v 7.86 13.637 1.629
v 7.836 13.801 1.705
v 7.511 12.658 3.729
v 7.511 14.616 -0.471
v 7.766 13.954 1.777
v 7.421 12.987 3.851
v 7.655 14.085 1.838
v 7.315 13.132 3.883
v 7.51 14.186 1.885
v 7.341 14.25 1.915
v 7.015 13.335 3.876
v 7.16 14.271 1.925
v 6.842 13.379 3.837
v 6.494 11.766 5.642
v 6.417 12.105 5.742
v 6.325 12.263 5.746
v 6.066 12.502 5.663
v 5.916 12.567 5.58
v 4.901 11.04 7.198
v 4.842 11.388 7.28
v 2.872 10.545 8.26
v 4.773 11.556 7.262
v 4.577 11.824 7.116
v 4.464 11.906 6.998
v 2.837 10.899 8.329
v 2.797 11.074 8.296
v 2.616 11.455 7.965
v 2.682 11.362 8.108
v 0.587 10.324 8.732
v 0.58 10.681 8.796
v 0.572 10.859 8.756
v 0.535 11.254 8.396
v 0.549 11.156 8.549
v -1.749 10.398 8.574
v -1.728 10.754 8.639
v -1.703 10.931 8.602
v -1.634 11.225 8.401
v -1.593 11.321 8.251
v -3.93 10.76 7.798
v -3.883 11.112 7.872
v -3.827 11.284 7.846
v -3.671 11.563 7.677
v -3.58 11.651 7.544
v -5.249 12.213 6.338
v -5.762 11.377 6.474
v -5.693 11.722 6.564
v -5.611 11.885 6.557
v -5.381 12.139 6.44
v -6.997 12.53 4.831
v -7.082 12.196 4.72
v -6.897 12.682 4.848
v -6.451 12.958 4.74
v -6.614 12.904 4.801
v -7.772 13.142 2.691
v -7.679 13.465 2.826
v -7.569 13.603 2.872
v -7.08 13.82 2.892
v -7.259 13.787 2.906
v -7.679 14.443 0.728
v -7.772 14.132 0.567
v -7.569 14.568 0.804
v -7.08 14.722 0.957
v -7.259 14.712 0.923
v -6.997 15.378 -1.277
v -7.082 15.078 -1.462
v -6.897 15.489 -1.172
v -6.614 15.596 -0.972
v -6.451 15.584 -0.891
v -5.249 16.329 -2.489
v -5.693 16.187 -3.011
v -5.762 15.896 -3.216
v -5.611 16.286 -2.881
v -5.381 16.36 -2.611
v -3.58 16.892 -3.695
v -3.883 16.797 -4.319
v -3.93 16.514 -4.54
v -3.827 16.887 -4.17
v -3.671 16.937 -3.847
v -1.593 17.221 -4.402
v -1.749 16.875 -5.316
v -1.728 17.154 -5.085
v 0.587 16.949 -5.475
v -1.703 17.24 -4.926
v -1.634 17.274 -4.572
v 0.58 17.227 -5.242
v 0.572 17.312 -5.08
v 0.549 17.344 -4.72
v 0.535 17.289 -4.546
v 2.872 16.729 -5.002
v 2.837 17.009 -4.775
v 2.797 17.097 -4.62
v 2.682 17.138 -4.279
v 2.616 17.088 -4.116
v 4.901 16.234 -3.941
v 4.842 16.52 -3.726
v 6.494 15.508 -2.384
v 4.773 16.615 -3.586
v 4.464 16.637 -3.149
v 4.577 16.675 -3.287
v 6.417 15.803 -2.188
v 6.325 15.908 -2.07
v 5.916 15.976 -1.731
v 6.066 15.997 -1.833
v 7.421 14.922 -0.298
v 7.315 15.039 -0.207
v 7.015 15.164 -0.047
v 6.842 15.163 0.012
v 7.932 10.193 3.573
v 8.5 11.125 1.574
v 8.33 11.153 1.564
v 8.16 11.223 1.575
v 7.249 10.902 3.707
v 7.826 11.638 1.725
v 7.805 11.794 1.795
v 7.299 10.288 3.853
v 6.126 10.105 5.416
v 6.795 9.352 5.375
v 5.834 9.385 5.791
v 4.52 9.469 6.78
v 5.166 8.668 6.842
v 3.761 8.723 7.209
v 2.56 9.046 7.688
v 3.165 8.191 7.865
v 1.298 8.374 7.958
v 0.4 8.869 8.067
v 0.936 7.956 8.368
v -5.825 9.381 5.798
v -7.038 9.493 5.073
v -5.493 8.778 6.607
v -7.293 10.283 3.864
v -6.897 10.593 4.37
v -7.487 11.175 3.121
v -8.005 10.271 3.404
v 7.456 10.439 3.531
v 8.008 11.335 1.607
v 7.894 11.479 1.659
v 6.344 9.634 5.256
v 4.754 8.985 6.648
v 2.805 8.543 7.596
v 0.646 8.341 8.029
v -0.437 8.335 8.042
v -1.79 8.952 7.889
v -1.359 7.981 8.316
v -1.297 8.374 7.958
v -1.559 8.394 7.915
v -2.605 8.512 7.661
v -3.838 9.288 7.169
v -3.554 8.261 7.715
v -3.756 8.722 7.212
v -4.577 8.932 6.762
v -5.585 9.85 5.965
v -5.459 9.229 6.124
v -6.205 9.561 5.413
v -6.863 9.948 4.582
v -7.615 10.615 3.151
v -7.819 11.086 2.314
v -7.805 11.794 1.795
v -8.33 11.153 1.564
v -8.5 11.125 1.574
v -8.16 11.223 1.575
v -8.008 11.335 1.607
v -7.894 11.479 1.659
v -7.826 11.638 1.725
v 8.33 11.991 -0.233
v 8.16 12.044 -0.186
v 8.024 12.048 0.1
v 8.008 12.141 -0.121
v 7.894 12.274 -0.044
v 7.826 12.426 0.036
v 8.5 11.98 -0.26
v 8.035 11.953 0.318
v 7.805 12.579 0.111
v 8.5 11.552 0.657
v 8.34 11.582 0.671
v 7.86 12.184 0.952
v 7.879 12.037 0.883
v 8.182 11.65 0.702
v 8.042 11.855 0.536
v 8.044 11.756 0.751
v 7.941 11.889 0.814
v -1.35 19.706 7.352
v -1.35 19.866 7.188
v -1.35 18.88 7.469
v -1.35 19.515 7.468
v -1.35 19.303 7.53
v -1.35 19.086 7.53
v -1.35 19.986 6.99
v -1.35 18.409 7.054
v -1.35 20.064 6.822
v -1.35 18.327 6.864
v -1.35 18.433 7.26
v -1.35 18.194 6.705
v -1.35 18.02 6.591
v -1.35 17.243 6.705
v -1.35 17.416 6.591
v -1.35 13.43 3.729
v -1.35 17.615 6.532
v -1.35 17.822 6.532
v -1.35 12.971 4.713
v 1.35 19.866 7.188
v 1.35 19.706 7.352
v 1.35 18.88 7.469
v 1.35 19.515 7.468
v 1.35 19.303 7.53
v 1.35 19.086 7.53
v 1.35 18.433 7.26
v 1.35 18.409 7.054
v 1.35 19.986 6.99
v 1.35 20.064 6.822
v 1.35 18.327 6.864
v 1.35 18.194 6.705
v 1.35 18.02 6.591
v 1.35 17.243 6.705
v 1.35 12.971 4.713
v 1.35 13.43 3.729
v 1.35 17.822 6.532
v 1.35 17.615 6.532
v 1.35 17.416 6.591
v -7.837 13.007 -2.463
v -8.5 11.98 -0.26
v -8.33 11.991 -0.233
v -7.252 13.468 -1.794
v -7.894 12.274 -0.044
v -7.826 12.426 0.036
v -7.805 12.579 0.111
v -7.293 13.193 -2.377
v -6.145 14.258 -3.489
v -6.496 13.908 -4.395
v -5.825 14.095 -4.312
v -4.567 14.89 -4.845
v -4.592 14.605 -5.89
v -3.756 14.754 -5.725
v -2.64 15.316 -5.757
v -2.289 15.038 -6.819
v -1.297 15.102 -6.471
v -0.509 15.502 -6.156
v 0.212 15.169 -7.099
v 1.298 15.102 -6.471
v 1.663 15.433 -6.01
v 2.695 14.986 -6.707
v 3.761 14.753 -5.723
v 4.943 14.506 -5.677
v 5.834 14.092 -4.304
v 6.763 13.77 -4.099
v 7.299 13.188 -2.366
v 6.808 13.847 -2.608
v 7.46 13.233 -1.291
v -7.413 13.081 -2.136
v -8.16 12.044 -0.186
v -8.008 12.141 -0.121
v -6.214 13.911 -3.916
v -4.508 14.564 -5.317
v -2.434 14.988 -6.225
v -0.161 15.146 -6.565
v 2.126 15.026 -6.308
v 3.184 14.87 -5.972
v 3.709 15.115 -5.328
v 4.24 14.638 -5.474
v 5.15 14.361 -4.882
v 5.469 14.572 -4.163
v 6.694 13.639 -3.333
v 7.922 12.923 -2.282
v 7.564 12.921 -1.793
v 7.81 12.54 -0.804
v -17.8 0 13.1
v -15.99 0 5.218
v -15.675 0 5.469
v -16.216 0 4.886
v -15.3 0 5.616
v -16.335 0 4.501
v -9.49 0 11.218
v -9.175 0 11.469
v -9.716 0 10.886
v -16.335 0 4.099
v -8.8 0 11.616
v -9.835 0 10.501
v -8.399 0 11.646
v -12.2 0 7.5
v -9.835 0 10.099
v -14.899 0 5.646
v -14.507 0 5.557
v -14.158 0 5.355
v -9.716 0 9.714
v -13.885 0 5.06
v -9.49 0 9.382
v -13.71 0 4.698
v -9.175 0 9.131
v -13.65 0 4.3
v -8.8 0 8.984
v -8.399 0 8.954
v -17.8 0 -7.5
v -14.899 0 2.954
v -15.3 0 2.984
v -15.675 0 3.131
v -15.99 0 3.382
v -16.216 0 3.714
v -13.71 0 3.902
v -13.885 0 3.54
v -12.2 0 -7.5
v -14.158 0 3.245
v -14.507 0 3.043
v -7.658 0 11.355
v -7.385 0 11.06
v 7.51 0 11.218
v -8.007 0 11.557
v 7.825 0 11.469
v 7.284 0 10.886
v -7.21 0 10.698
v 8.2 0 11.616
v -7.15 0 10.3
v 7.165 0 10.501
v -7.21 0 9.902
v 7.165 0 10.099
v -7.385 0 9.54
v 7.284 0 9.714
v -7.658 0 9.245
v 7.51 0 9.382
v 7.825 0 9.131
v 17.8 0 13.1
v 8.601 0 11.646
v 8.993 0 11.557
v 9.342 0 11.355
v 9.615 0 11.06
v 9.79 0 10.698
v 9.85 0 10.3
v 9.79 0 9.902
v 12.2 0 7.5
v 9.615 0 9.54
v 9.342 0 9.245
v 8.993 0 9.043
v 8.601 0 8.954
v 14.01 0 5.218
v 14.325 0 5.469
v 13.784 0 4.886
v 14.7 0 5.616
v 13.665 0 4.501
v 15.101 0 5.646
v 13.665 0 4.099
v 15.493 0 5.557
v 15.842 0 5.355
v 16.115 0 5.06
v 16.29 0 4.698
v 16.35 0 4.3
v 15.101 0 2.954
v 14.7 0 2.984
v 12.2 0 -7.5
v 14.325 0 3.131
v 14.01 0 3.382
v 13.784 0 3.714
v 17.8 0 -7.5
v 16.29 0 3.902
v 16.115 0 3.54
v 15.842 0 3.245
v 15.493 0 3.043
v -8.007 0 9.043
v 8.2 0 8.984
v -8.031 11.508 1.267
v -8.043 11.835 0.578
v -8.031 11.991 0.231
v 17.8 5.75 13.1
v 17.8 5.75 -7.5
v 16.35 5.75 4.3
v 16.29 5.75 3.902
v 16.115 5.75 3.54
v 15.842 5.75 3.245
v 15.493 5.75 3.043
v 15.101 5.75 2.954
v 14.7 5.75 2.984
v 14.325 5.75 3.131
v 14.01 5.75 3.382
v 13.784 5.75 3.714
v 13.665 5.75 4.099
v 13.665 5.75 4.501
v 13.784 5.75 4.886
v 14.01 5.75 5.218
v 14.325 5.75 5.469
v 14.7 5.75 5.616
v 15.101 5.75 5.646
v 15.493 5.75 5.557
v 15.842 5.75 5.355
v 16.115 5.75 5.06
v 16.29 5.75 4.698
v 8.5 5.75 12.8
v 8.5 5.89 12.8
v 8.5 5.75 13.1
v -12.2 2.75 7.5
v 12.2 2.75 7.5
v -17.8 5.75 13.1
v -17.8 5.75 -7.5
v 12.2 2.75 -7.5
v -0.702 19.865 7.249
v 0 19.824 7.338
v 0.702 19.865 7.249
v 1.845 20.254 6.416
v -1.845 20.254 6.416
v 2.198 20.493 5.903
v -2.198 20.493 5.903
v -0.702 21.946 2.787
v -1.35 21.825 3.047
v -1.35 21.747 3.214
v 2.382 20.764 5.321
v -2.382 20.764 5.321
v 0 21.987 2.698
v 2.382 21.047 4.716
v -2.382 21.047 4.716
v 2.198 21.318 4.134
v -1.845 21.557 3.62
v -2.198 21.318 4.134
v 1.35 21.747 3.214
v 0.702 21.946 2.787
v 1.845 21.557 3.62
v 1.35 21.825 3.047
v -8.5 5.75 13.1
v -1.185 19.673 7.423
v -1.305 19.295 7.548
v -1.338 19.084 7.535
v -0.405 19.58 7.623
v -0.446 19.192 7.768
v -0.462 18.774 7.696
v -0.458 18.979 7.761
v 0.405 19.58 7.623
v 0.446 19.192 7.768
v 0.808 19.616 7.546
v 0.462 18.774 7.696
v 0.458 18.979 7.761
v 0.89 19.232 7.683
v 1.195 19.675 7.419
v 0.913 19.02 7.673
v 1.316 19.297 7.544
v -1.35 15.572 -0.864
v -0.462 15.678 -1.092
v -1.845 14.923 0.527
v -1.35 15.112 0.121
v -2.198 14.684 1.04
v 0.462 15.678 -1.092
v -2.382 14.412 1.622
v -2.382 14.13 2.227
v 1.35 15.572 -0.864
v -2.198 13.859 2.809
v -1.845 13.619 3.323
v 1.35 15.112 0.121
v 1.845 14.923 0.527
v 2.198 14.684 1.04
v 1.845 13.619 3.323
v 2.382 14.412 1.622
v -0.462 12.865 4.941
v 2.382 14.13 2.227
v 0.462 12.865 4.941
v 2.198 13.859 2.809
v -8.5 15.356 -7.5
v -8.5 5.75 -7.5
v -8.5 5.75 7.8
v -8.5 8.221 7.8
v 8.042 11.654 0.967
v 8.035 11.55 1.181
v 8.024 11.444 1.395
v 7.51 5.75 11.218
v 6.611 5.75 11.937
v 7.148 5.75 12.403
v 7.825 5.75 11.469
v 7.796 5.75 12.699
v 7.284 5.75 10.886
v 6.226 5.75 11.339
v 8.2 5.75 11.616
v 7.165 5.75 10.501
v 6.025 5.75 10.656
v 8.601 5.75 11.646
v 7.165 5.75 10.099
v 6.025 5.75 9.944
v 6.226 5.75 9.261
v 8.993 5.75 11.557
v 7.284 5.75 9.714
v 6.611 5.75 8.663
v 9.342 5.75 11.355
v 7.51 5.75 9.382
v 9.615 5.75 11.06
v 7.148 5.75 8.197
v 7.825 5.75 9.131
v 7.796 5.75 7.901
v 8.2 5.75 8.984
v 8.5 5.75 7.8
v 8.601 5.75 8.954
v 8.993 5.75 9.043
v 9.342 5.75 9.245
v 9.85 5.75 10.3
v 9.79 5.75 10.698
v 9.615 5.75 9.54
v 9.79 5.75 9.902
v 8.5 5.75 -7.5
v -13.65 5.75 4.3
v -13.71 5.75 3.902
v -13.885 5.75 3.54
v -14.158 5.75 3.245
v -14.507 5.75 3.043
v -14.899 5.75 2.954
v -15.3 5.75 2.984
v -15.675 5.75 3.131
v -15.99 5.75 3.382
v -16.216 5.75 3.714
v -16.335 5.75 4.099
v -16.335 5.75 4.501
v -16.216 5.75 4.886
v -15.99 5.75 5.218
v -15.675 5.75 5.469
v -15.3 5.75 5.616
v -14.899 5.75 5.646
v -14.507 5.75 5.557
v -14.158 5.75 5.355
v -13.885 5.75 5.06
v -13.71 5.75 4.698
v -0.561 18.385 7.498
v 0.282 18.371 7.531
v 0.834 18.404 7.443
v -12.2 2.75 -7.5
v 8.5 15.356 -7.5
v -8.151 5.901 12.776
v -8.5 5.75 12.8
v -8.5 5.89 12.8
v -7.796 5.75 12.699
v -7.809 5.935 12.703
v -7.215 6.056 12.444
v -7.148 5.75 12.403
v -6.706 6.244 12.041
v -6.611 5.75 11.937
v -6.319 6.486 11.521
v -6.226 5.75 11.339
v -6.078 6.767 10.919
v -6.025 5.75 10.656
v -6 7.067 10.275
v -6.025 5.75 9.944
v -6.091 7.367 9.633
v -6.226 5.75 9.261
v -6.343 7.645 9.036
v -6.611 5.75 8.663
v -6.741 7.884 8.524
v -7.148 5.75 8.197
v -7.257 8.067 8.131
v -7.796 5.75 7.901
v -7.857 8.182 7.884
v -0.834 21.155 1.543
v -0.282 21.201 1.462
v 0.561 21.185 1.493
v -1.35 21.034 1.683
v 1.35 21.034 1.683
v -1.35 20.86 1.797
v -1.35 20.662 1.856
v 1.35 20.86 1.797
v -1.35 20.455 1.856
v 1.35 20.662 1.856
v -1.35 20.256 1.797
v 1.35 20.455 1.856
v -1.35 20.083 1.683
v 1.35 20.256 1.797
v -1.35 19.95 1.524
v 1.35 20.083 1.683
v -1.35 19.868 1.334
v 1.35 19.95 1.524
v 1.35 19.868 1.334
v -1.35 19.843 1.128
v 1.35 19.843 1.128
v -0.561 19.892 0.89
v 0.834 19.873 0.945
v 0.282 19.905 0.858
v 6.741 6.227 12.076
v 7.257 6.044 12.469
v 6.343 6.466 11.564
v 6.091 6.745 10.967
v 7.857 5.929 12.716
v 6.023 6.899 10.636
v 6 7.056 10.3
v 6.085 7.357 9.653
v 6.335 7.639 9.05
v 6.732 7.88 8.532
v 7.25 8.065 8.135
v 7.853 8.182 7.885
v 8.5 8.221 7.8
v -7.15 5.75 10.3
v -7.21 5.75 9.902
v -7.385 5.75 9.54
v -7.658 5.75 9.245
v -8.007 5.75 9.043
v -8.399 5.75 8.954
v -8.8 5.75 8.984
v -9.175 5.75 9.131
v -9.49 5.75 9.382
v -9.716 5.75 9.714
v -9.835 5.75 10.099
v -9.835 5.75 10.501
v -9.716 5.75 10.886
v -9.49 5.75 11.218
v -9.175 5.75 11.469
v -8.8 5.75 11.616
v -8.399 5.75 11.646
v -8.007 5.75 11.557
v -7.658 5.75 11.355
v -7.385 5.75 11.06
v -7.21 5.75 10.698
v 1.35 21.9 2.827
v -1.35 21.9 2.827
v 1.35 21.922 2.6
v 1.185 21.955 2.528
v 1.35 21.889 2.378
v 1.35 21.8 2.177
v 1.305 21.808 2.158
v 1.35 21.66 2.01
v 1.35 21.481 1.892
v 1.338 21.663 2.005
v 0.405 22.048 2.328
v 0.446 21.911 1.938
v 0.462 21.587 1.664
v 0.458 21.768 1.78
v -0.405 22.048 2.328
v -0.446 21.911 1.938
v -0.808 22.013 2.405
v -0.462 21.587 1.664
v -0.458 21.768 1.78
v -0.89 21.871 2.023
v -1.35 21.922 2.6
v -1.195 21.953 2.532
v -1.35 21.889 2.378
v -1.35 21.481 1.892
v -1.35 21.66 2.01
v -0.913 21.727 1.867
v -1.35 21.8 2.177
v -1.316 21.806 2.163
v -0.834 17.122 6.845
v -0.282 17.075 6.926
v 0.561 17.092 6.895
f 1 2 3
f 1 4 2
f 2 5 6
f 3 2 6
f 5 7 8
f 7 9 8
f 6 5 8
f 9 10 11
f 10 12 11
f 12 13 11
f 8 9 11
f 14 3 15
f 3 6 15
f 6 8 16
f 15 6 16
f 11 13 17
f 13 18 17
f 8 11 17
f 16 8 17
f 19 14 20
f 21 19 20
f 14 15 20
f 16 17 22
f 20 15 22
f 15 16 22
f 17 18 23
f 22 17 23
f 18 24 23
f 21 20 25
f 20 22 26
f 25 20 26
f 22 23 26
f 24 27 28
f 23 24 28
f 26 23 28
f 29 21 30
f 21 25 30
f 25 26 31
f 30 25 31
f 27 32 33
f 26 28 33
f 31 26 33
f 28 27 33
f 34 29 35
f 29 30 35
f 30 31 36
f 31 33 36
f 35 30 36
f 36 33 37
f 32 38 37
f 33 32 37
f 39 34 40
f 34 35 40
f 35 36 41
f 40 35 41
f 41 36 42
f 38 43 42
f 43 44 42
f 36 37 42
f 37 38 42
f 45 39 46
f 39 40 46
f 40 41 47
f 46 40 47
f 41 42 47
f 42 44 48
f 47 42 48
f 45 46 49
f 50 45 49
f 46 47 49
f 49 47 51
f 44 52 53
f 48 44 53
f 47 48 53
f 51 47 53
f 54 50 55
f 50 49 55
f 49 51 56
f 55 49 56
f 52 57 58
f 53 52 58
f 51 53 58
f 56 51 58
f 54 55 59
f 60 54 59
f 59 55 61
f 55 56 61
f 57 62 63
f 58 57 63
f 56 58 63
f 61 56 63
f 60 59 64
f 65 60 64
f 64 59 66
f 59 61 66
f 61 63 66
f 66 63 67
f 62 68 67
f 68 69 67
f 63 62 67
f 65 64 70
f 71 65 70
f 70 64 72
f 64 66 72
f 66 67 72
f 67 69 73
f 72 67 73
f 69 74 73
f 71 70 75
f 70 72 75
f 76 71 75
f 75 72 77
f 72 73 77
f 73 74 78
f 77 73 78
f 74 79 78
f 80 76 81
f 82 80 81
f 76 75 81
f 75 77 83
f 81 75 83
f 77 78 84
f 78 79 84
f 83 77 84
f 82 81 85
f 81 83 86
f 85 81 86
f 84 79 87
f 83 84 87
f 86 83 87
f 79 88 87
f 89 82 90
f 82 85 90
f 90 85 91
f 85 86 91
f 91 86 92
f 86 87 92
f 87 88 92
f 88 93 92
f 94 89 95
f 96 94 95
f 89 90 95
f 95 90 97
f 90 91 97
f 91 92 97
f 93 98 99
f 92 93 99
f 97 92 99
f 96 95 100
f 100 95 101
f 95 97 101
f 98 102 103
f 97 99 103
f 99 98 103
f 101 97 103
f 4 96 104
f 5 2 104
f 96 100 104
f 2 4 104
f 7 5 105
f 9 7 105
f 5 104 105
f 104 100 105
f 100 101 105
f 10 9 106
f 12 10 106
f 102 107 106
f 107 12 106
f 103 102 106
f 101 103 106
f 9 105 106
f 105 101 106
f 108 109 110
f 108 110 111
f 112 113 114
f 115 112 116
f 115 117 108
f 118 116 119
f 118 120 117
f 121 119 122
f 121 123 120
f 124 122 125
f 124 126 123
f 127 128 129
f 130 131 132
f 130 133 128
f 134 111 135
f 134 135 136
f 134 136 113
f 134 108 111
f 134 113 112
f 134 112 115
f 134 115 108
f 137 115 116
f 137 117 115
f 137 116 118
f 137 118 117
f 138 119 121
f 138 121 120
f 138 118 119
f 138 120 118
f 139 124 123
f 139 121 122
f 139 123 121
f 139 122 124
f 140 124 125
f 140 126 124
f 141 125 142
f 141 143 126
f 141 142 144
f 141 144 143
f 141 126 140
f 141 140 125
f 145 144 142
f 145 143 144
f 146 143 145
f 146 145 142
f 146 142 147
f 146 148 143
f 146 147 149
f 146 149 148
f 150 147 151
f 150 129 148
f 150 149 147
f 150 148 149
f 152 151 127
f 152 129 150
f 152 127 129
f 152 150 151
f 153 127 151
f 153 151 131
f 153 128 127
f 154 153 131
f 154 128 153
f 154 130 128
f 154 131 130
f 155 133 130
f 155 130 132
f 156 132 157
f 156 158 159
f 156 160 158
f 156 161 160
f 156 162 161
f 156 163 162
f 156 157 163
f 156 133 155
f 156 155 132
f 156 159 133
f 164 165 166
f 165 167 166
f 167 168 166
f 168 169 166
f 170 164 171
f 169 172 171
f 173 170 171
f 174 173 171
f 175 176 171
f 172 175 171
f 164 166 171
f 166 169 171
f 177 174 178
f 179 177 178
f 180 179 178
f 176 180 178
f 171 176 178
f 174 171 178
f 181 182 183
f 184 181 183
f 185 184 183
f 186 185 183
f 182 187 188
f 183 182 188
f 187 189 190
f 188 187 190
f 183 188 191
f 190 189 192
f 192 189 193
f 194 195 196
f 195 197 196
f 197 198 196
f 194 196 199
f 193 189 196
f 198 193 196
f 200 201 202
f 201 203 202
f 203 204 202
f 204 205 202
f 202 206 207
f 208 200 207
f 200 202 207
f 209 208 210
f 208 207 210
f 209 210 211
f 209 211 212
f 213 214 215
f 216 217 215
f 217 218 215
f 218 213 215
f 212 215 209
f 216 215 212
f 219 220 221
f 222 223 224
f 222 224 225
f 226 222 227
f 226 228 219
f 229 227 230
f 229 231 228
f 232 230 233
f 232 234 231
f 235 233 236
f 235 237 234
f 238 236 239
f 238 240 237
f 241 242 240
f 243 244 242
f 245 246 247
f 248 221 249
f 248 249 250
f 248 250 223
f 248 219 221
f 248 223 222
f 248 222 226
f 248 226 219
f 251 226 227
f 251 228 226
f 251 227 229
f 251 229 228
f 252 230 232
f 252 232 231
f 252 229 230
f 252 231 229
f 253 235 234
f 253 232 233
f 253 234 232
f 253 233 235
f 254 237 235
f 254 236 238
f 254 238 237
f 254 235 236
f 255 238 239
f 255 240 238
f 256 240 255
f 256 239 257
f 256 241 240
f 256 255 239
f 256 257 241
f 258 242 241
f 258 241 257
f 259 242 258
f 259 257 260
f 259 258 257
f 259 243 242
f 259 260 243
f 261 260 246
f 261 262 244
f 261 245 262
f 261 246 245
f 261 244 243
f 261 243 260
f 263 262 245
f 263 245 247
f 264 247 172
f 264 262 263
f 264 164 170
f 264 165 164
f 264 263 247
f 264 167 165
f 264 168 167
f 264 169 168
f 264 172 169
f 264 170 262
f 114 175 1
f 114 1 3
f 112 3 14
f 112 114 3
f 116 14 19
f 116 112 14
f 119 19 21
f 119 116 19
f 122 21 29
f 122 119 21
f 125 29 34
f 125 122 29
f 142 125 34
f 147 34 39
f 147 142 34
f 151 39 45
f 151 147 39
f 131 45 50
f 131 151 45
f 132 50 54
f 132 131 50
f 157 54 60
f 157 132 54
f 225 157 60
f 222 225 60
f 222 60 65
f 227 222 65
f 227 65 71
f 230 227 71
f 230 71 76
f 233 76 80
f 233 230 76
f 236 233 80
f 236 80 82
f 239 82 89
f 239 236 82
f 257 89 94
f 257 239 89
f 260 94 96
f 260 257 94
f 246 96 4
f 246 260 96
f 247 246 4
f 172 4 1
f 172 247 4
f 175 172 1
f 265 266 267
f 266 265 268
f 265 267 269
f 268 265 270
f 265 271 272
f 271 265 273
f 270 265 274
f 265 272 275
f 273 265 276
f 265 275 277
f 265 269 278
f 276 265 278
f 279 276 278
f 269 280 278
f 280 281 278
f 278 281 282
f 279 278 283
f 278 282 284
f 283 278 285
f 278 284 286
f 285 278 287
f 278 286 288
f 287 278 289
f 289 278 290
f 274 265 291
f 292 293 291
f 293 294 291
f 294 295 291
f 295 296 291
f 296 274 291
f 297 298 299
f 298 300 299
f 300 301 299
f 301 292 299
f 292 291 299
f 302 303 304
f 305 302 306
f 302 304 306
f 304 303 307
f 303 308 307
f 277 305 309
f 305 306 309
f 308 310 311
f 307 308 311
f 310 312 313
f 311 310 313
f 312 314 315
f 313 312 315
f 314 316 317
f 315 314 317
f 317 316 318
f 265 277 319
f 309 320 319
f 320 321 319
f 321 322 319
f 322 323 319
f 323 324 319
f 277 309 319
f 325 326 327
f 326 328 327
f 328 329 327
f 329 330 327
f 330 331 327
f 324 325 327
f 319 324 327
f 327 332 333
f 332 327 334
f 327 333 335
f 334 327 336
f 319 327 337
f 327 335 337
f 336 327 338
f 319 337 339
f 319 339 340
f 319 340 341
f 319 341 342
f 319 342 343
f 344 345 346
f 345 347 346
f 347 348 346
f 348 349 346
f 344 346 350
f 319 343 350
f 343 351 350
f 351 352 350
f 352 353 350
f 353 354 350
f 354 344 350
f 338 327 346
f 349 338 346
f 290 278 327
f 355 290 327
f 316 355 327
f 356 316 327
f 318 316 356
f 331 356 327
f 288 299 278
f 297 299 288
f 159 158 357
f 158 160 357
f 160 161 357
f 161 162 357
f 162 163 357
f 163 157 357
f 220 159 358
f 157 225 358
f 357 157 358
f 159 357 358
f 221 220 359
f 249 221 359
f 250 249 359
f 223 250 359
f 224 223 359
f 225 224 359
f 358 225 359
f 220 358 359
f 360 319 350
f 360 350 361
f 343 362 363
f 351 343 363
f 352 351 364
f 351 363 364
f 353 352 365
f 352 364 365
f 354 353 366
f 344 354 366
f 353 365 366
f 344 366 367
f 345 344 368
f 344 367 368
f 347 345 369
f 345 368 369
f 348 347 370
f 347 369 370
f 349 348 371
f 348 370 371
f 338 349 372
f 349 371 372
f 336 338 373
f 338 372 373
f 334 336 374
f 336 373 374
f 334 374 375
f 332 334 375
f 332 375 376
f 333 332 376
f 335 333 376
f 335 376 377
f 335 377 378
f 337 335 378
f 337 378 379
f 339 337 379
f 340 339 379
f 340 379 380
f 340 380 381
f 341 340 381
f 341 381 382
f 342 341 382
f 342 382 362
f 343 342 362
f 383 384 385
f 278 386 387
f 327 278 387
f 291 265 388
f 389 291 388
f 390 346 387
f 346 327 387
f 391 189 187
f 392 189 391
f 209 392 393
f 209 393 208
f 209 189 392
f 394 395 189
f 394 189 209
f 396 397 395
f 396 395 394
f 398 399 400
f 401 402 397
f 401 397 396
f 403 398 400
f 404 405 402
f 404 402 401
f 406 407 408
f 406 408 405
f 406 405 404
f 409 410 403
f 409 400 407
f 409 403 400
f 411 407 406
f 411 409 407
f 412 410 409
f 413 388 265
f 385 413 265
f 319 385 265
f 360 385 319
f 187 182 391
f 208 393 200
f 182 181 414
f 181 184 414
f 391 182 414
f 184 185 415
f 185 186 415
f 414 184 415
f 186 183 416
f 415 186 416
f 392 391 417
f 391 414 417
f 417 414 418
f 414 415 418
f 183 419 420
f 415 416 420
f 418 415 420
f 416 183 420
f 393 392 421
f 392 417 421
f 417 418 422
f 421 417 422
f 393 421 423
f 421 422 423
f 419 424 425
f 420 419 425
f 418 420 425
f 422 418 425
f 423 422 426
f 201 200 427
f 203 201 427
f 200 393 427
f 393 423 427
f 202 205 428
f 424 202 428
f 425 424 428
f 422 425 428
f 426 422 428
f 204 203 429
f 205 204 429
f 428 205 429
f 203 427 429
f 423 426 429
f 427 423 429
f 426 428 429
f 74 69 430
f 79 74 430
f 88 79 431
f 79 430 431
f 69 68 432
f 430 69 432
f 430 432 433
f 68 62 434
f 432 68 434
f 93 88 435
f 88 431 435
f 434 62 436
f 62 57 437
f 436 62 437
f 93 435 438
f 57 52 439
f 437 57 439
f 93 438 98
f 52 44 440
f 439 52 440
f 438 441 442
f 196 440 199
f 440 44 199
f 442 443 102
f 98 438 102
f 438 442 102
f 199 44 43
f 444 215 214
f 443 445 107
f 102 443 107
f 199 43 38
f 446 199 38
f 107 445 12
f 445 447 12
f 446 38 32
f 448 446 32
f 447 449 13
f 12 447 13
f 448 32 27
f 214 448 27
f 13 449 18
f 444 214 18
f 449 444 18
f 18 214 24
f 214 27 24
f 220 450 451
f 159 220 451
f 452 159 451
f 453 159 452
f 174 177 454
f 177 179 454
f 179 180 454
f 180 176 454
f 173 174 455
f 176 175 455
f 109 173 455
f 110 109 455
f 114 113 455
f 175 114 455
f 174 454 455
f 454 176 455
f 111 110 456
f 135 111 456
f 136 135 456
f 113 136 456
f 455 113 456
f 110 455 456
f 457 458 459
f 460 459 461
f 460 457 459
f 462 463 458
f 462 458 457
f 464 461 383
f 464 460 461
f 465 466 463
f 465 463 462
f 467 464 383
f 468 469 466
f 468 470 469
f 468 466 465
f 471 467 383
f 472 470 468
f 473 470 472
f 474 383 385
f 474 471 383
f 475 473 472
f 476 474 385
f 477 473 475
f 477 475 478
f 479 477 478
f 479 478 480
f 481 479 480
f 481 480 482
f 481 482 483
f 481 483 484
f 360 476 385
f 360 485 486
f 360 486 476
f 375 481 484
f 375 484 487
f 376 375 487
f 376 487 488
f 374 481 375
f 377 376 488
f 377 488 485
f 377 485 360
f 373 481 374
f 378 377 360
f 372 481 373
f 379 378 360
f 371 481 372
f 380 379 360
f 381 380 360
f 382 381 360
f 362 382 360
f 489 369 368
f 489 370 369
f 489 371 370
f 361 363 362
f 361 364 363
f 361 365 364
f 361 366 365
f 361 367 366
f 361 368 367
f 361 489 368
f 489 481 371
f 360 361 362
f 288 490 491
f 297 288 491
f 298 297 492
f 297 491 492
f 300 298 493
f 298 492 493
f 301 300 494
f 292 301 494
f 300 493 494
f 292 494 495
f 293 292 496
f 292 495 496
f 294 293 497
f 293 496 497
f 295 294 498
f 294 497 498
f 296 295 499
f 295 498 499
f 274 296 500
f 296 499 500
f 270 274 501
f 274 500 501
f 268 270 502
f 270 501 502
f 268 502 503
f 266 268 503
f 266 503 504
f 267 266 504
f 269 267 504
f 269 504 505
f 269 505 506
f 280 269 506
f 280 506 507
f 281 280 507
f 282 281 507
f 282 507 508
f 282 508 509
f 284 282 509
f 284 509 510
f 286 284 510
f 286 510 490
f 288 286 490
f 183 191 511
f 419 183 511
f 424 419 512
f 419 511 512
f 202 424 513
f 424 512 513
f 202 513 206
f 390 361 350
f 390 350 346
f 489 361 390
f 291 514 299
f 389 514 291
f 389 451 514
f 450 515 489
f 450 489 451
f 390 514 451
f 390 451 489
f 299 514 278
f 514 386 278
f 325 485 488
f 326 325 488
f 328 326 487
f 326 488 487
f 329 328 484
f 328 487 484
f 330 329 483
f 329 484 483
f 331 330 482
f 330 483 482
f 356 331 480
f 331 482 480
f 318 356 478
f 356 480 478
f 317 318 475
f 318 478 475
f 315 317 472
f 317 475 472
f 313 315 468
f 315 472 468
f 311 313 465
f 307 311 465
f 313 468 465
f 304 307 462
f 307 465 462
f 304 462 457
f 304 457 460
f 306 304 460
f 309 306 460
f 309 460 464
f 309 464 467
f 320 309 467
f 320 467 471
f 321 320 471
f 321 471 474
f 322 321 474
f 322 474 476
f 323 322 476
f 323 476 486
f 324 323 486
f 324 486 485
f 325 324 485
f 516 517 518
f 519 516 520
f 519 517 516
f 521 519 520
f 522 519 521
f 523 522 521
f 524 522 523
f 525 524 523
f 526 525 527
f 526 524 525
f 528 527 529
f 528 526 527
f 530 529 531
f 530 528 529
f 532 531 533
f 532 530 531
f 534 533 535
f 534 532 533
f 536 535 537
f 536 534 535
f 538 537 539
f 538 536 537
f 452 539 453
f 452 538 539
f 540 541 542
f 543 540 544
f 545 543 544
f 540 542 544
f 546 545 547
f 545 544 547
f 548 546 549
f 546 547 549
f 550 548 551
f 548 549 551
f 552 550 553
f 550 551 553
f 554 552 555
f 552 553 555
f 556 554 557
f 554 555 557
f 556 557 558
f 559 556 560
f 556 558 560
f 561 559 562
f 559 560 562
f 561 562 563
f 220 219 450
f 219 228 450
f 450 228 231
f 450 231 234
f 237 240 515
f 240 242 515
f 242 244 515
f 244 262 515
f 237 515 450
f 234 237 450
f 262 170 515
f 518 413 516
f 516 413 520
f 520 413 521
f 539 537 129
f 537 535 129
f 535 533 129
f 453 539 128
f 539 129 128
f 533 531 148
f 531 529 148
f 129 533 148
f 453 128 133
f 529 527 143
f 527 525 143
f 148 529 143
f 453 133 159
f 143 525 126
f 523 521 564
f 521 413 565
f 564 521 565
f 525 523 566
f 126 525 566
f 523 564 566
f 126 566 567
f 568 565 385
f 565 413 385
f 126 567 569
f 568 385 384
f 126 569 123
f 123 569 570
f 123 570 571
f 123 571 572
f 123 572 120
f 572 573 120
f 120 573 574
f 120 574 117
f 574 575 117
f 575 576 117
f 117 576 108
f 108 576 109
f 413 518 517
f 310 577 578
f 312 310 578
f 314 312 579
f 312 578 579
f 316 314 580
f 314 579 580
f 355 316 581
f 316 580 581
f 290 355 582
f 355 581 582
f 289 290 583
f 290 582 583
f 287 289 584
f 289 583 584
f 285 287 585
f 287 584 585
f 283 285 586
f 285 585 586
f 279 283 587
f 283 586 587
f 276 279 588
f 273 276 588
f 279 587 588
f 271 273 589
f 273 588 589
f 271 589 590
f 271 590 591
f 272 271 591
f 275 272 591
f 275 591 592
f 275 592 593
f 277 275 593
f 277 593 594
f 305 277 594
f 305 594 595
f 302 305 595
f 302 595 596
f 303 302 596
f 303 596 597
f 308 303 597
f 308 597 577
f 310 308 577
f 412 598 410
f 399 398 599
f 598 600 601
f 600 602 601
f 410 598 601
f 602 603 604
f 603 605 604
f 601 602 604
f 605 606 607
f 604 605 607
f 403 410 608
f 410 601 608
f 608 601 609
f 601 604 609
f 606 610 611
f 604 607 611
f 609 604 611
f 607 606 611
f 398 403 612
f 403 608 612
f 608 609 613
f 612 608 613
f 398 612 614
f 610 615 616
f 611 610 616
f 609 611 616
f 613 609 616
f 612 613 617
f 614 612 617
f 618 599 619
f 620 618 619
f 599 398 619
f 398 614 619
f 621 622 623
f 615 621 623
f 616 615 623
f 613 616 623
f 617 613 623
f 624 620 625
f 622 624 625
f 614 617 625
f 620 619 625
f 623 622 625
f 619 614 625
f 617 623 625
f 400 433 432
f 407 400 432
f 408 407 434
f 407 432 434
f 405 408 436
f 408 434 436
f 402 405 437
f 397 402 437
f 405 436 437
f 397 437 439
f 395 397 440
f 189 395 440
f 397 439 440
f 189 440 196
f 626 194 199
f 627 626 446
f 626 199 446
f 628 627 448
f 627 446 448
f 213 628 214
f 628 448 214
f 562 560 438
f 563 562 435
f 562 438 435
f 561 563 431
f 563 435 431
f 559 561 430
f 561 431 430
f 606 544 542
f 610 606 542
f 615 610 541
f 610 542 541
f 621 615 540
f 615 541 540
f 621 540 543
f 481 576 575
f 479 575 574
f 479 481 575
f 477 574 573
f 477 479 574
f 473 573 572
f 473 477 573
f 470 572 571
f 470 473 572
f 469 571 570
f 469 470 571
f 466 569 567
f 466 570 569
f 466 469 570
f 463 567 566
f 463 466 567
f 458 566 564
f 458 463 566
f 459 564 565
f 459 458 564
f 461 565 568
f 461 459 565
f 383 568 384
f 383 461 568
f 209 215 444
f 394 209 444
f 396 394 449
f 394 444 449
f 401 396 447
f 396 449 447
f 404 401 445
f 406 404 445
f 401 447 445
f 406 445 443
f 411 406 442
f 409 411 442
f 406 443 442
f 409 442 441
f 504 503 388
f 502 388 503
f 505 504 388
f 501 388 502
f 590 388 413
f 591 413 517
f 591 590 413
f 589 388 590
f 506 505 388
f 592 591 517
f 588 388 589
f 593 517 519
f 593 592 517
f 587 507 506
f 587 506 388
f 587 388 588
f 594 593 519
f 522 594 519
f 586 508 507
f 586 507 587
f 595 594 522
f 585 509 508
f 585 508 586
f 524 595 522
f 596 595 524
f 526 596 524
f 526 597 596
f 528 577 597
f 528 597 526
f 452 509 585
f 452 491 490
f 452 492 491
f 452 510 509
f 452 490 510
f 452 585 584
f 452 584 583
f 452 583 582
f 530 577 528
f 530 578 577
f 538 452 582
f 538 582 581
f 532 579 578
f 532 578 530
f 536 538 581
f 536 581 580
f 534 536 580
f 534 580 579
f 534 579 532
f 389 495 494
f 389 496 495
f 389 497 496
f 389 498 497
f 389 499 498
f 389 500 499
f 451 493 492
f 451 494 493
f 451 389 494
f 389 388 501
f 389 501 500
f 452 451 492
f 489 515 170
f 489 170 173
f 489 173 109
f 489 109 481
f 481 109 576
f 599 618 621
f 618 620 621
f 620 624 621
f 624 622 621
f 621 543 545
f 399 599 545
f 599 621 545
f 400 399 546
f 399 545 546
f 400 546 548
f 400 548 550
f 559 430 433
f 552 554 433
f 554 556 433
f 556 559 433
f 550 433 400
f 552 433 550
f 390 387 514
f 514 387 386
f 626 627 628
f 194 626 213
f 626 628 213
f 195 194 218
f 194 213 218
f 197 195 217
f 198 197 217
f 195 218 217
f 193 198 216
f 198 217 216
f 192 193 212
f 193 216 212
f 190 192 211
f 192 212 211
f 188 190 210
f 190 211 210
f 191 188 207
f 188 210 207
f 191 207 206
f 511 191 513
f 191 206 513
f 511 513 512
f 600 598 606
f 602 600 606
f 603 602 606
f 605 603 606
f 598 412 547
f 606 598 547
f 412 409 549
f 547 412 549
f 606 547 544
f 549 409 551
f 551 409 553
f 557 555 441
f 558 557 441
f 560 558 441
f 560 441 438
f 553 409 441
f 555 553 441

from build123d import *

# Parameters (mm, degrees)
BOSS_EXTRUDE1_DEPTH = 7.5
SKETCH8_W           = 35.6
SKETCH8_H           = 5.75
BOSS_EXTRUDE4_DEPTH = 5.6
BOSS_EXTRUDE5_DEPTH = 8.5
SKETCH3_R           = 7.86
BOSS_EXTRUDE2_DEPTH = 3
FILLET4_R           = 0.7
BOSS_EXTRUDE3_DEPTH = 7.32
SKETCH6_R           = 0.715
CUT_EXTRUDE2_DEPTH  = 20.15
FILLET5_R           = 0.8
SKETCH9_R           = 1.35
CUT_EXTRUDE3_DEPTH  = 6.75
SKETCH12_R          = 2.5
CUT_EXTRUDE4_DEPTH  = 17.312326385


with BuildPart() as part:
    # Sketch1 → Boss-Extrude1 (new body, symmetric)
    with BuildSketch(Plane.XY):
        Polygon((-17.8, 5.75), (17.8, 5.75), (17.8, 0), (12.2, 0), (12.2, 2.75), (-12.2, 2.75), (-12.2, 0), (-17.8, 0), align=None)
    extrude(amount=BOSS_EXTRUDE1_DEPTH, both=True)

    # Sketch8 → Boss-Extrude4 (add)
    with BuildSketch(Plane.XY.offset(7.5)):
        with Locations((0, 2.875)):
            Rectangle(SKETCH8_W, SKETCH8_H)
    extrude(amount=BOSS_EXTRUDE4_DEPTH)

    # Sketch11 → Boss-Extrude5 (add, symmetric)
    with BuildSketch(Plane(origin=(0, 0, 0), x_dir=(0, 0, -1), z_dir=(1, 0, 0))):
        Polygon((-13.1, 5.75), (7.5, 15.355937758), (7.5, 5.75), align=None)
    extrude(amount=BOSS_EXTRUDE5_DEPTH, both=True)

    # Sketch3 → Boss-Extrude2 (add)
    with BuildSketch(Plane(origin=(0, -0.825909529, 27.202083493), x_dir=(1, 0, 0), z_dir=(0, -0.906307787, -0.422618262))):
        with Locations((0, -29.289512668)):
            Circle(SKETCH3_R)
    extrude(amount=-BOSS_EXTRUDE2_DEPTH)

    # Fillet4
    fillet4_edges = [part.edges().sort_by_distance(p)[0] for p in [
        (-7.86, 14.271296763, 1.924624869),
        (-7.86, 11.552373402, 0.656770083),
    ]]
    fillet(fillet4_edges, radius=FILLET4_R)

    # Sketch5 → Boss-Extrude3 (add)
    with BuildSketch(Plane(origin=(0, 12.459528841, 5.809973716), x_dir=(1, 0, 0), z_dir=(0, 0.906307787, 0.422618262))):
        with BuildLine():
            Line((1.35, 6.277366133), (1.35, 7.363873413))
            ThreePointArc((1.35, 7.363873413), (0, 7.647008125), (-1.35, 7.363873413))
            Line((-1.35, 7.363873413), (-1.35, 6.277366133))
            ThreePointArc((-1.35, 6.277366133), (-2.405, 4.287008125), (-1.35, 2.296650117))
            Line((-1.35, 2.296650117), (-1.35, 1.210142838))
            ThreePointArc((-1.35, 1.210142838), (0, 0.927008125), (1.35, 1.210142838))
            Line((1.35, 1.210142838), (1.35, 2.296650117))
            ThreePointArc((1.35, 2.296650117), (2.405, 4.287008125), (1.35, 6.277366133))
        make_face()
    extrude(amount=BOSS_EXTRUDE3_DEPTH)

    # Sketch6 → Cut-Extrude2 (cut, through all)
    with BuildSketch(Plane(origin=(1.35, 0, 0), x_dir=(0, 0, -1), z_dir=(1, 0, 0))):
        with Locations((-7.239279099, 17.71817222)):
            Circle(SKETCH6_R)
        with Locations((-1.14889077, 20.558166939)):
            Circle(SKETCH6_R)
    extrude(amount=-CUT_EXTRUDE2_DEPTH, mode=Mode.SUBTRACT)

    # Fillet5
    fillet5_edges = [part.edges().sort_by_distance(p)[0] for p in [
        (0, 19.485472405, 8.063384709),
        (0, 22.325467124, 1.97299638),
    ]]
    fillet(fillet5_edges, radius=FILLET5_R)

    # Sketch9 → Cut-Extrude3 (cut, through all)
    with BuildSketch(Plane(origin=(0, 5.75, 0), x_dir=(1, 0, 0), z_dir=(0, 1, 0))):
        with Locations((-8.5, -10.3)):
            Circle(SKETCH9_R)
        with Locations((-15, -4.3)):
            Circle(SKETCH9_R)
        with Locations((8.5, -10.3)):
            Circle(SKETCH9_R)
        with Locations((15, -4.3)):
            Circle(SKETCH9_R)
    extrude(amount=-CUT_EXTRUDE3_DEPTH, mode=Mode.SUBTRACT)

    # Sketch12 → Cut-Extrude4 (cut, through all)
    with BuildSketch(Plane(origin=(0, 5.75, 0), x_dir=(-1, 0, 0), z_dir=(0, 1, 0))):
        with Locations((8.5, 10.3)):
            Circle(SKETCH12_R)
        with Locations((-8.5, 10.3)):
            Circle(SKETCH12_R)
    extrude(amount=CUT_EXTRUDE4_DEPTH, mode=Mode.SUBTRACT)


solid = part.part
